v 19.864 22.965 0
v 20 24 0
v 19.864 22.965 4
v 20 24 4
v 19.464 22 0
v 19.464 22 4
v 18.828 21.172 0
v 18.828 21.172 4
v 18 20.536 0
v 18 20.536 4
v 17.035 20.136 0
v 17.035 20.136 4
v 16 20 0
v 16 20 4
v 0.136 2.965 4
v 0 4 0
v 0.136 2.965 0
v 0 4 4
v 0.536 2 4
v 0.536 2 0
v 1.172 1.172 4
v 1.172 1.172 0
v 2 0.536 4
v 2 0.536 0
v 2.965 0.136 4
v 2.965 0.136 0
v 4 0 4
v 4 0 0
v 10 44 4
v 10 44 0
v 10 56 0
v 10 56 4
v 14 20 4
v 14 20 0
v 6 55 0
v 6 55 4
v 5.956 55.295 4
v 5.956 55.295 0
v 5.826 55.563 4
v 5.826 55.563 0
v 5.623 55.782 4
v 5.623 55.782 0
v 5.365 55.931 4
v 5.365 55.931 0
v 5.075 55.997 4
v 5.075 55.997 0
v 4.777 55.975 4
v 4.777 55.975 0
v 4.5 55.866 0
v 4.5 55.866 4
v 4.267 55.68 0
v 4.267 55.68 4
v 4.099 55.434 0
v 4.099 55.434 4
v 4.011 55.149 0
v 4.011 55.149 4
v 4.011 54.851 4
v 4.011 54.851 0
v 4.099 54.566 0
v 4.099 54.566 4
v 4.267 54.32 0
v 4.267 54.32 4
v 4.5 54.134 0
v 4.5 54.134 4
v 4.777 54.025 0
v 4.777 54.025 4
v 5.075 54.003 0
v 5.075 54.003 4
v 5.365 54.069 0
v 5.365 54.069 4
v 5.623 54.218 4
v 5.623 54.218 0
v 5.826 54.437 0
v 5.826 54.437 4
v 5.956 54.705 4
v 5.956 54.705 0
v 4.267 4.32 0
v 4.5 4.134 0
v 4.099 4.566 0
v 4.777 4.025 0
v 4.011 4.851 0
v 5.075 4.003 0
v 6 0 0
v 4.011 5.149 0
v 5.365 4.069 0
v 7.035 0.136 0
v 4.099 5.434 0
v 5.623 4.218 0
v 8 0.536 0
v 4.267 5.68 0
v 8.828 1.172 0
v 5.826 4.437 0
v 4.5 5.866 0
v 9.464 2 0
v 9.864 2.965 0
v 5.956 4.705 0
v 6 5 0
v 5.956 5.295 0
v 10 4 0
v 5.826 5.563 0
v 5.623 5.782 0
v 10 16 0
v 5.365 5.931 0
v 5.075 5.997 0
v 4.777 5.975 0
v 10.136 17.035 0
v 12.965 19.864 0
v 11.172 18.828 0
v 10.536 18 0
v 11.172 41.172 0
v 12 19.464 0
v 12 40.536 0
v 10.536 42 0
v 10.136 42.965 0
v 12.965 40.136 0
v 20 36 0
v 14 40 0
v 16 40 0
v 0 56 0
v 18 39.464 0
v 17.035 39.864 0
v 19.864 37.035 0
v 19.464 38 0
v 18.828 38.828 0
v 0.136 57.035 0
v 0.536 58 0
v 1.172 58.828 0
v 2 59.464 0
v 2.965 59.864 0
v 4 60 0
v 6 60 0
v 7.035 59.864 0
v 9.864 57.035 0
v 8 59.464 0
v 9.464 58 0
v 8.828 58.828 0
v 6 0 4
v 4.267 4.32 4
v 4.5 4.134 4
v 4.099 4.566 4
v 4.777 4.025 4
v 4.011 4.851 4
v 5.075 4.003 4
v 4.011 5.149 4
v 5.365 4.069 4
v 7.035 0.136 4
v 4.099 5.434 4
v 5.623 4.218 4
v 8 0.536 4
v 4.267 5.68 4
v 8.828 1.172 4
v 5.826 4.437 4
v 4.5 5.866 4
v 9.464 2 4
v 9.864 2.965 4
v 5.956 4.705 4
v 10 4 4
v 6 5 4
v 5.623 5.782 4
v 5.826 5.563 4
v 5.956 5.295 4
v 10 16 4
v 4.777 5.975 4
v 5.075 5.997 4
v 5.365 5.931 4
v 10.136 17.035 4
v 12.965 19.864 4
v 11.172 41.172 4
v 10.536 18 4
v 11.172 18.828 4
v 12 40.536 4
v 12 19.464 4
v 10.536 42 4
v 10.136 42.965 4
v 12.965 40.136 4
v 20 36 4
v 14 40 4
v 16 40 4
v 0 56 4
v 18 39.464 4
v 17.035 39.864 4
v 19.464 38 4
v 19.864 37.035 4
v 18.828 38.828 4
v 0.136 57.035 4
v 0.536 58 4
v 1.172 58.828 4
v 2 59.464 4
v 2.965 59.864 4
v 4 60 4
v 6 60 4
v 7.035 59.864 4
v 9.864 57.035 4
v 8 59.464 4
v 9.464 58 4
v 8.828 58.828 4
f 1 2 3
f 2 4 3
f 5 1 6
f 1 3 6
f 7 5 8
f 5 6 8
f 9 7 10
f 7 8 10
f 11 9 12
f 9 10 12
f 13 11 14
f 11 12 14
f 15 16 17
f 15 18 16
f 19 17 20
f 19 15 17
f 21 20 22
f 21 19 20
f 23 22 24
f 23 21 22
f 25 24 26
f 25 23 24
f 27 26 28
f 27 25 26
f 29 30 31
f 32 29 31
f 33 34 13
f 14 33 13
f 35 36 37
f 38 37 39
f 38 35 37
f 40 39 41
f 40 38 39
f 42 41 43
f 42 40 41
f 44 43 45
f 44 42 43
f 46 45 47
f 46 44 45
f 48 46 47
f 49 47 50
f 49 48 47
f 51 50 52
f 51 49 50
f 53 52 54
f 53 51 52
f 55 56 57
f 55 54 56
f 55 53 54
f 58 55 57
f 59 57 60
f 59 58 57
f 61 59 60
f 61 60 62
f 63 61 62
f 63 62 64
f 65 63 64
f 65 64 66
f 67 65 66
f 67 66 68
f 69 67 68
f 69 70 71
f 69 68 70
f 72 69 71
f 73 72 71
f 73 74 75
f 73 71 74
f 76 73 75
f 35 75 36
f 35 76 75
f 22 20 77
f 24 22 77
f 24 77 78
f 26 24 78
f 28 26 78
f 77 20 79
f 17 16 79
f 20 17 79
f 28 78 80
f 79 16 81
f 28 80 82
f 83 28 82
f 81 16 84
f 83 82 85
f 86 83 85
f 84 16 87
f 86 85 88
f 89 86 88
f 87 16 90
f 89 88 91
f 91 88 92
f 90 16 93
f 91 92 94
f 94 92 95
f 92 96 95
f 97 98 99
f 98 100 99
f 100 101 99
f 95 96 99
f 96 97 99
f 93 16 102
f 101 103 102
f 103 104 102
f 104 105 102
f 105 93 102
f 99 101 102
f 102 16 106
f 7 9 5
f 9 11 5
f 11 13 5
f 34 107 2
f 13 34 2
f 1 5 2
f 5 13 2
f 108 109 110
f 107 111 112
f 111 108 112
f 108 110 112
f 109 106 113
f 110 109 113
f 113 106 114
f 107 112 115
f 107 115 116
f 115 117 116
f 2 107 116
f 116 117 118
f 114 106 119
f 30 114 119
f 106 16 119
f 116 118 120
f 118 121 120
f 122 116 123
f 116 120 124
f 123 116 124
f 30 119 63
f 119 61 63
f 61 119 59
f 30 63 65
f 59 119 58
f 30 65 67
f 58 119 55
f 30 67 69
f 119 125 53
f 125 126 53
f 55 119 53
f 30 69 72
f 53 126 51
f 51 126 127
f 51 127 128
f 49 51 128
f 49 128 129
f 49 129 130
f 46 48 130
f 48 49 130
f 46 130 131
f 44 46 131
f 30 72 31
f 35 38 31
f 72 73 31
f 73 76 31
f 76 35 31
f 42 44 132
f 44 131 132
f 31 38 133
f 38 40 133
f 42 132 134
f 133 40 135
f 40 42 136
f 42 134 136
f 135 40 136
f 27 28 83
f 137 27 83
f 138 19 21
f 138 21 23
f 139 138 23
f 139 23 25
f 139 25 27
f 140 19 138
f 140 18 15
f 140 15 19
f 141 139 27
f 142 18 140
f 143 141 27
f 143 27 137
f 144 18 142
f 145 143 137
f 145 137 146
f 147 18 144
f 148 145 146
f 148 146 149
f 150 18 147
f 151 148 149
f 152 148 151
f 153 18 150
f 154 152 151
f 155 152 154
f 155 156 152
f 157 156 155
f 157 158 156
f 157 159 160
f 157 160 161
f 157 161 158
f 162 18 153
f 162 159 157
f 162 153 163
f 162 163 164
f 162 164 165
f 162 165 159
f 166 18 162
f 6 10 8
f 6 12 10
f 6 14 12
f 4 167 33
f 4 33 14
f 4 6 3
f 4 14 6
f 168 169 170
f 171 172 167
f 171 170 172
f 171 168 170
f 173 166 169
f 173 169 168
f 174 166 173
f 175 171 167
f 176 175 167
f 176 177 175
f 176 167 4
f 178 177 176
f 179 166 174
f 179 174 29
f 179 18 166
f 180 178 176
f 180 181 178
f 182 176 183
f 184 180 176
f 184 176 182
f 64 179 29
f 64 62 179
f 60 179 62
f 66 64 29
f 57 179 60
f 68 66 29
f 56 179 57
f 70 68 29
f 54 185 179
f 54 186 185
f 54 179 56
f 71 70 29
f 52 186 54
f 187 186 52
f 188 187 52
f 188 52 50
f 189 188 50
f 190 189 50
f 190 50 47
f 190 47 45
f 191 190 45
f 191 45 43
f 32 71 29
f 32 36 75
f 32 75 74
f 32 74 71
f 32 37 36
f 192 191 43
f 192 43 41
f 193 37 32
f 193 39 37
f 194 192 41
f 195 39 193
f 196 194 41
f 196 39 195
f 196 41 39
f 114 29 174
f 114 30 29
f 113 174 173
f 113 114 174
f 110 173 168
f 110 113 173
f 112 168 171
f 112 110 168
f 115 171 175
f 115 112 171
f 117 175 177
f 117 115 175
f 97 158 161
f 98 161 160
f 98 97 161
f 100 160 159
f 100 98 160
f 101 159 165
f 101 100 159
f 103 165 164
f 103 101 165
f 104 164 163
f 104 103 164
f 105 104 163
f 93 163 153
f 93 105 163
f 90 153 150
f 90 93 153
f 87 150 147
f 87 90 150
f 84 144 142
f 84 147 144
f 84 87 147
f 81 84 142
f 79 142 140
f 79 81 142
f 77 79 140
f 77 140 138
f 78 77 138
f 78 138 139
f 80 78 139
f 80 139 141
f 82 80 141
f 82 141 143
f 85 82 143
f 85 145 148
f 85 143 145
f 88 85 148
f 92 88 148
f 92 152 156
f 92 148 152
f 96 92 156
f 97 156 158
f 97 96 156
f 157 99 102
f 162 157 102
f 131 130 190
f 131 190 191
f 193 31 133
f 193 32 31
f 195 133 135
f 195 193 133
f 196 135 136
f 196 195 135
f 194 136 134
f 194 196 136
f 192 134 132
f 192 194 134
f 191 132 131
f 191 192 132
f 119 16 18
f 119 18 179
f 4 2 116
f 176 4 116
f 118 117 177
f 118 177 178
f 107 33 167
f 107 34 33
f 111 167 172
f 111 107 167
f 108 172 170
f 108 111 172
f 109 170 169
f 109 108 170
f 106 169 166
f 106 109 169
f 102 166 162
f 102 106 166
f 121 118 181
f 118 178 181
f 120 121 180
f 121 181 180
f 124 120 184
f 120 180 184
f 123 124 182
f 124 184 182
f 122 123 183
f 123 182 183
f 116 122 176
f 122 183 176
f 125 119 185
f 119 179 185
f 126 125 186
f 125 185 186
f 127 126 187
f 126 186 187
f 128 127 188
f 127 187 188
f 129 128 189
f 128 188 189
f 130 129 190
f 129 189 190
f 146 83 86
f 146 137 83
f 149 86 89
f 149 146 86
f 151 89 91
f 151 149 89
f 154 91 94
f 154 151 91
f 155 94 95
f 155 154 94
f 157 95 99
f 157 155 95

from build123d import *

# Parameters (mm, degrees)
CYLINDER005_R     = 1
CYLINDER005_DEPTH = 20
ARRAY005_Y_COUNT  = 2
ARRAY005_Y_PITCH  = 50
BOX005_W          = 20
BOX005_H          = 20
BOX005_DEPTH      = 4
BOX004_W          = 10
BOX004_H          = 60
BOX004_DEPTH      = 4
FILLET_R          = 4
FILLET001_R       = 4


with BuildPart() as ear_screw_hole_fusion_array:
    # Cylinder005 → Cylinder005 (new body)
    with BuildSketch(Plane.XY.offset(40)):
        Circle(CYLINDER005_R)
    extrude(amount=CYLINDER005_DEPTH)

    # Array005 Y: ear screw hole fusion array ×2


with BuildPart() as ear_screw_hole_fusion_array_1:
    add(ear_screw_hole_fusion_array.part)
    with Locations(*[(0, i * ARRAY005_Y_PITCH, 0) for i in range(1, ARRAY005_Y_COUNT)]):
        add(ear_screw_hole_fusion_array.part)


with BuildPart() as ear_screw_hole_fusion_array_2:
    # Array005 placement: moved
    add(ear_screw_hole_fusion_array_1.part.moved(Location((5, 5, -40))))


with BuildPart() as mount_plate:
    # Box005 → Box005 (new body)
    with BuildSketch(Plane(origin=(0, 20, 0), x_dir=(1, 0, 0), z_dir=(0, 0, 1))):
        with Locations((10, 10)):
            Rectangle(BOX005_W, BOX005_H)
    extrude(amount=BOX005_DEPTH)


with BuildPart() as ear_mount_cut:
    # Box004 → Box004 (new body)
    with BuildSketch(Plane.XY):
        with Locations((5, 30)):
            Rectangle(BOX004_W, BOX004_H)
    extrude(amount=BOX004_DEPTH)

    # Fillet
    fillet_edges = [ear_mount_cut.edges().sort_by_distance(p)[0] for p in [
        (0, 0, 2),
        (0, 60, 2),
        (10, 0, 2),
        (10, 60, 2),
    ]]
    fillet(fillet_edges, radius=FILLET_R)

    # Fusion001: union mount plate
    add(mount_plate.part)

    # Fillet001
    fillet001_edges = [ear_mount_cut.edges().sort_by_distance(p)[0] for p in [
        (10, 20, 2),
        (10, 40, 2),
        (20, 40, 2),
        (20, 20, 2),
    ]]
    fillet(fillet001_edges, radius=FILLET001_R)

    # Cut023015002: cut ear screw hole fusion array
    add(ear_screw_hole_fusion_array_2.part, mode=Mode.SUBTRACT)


solid = ear_mount_cut.part
